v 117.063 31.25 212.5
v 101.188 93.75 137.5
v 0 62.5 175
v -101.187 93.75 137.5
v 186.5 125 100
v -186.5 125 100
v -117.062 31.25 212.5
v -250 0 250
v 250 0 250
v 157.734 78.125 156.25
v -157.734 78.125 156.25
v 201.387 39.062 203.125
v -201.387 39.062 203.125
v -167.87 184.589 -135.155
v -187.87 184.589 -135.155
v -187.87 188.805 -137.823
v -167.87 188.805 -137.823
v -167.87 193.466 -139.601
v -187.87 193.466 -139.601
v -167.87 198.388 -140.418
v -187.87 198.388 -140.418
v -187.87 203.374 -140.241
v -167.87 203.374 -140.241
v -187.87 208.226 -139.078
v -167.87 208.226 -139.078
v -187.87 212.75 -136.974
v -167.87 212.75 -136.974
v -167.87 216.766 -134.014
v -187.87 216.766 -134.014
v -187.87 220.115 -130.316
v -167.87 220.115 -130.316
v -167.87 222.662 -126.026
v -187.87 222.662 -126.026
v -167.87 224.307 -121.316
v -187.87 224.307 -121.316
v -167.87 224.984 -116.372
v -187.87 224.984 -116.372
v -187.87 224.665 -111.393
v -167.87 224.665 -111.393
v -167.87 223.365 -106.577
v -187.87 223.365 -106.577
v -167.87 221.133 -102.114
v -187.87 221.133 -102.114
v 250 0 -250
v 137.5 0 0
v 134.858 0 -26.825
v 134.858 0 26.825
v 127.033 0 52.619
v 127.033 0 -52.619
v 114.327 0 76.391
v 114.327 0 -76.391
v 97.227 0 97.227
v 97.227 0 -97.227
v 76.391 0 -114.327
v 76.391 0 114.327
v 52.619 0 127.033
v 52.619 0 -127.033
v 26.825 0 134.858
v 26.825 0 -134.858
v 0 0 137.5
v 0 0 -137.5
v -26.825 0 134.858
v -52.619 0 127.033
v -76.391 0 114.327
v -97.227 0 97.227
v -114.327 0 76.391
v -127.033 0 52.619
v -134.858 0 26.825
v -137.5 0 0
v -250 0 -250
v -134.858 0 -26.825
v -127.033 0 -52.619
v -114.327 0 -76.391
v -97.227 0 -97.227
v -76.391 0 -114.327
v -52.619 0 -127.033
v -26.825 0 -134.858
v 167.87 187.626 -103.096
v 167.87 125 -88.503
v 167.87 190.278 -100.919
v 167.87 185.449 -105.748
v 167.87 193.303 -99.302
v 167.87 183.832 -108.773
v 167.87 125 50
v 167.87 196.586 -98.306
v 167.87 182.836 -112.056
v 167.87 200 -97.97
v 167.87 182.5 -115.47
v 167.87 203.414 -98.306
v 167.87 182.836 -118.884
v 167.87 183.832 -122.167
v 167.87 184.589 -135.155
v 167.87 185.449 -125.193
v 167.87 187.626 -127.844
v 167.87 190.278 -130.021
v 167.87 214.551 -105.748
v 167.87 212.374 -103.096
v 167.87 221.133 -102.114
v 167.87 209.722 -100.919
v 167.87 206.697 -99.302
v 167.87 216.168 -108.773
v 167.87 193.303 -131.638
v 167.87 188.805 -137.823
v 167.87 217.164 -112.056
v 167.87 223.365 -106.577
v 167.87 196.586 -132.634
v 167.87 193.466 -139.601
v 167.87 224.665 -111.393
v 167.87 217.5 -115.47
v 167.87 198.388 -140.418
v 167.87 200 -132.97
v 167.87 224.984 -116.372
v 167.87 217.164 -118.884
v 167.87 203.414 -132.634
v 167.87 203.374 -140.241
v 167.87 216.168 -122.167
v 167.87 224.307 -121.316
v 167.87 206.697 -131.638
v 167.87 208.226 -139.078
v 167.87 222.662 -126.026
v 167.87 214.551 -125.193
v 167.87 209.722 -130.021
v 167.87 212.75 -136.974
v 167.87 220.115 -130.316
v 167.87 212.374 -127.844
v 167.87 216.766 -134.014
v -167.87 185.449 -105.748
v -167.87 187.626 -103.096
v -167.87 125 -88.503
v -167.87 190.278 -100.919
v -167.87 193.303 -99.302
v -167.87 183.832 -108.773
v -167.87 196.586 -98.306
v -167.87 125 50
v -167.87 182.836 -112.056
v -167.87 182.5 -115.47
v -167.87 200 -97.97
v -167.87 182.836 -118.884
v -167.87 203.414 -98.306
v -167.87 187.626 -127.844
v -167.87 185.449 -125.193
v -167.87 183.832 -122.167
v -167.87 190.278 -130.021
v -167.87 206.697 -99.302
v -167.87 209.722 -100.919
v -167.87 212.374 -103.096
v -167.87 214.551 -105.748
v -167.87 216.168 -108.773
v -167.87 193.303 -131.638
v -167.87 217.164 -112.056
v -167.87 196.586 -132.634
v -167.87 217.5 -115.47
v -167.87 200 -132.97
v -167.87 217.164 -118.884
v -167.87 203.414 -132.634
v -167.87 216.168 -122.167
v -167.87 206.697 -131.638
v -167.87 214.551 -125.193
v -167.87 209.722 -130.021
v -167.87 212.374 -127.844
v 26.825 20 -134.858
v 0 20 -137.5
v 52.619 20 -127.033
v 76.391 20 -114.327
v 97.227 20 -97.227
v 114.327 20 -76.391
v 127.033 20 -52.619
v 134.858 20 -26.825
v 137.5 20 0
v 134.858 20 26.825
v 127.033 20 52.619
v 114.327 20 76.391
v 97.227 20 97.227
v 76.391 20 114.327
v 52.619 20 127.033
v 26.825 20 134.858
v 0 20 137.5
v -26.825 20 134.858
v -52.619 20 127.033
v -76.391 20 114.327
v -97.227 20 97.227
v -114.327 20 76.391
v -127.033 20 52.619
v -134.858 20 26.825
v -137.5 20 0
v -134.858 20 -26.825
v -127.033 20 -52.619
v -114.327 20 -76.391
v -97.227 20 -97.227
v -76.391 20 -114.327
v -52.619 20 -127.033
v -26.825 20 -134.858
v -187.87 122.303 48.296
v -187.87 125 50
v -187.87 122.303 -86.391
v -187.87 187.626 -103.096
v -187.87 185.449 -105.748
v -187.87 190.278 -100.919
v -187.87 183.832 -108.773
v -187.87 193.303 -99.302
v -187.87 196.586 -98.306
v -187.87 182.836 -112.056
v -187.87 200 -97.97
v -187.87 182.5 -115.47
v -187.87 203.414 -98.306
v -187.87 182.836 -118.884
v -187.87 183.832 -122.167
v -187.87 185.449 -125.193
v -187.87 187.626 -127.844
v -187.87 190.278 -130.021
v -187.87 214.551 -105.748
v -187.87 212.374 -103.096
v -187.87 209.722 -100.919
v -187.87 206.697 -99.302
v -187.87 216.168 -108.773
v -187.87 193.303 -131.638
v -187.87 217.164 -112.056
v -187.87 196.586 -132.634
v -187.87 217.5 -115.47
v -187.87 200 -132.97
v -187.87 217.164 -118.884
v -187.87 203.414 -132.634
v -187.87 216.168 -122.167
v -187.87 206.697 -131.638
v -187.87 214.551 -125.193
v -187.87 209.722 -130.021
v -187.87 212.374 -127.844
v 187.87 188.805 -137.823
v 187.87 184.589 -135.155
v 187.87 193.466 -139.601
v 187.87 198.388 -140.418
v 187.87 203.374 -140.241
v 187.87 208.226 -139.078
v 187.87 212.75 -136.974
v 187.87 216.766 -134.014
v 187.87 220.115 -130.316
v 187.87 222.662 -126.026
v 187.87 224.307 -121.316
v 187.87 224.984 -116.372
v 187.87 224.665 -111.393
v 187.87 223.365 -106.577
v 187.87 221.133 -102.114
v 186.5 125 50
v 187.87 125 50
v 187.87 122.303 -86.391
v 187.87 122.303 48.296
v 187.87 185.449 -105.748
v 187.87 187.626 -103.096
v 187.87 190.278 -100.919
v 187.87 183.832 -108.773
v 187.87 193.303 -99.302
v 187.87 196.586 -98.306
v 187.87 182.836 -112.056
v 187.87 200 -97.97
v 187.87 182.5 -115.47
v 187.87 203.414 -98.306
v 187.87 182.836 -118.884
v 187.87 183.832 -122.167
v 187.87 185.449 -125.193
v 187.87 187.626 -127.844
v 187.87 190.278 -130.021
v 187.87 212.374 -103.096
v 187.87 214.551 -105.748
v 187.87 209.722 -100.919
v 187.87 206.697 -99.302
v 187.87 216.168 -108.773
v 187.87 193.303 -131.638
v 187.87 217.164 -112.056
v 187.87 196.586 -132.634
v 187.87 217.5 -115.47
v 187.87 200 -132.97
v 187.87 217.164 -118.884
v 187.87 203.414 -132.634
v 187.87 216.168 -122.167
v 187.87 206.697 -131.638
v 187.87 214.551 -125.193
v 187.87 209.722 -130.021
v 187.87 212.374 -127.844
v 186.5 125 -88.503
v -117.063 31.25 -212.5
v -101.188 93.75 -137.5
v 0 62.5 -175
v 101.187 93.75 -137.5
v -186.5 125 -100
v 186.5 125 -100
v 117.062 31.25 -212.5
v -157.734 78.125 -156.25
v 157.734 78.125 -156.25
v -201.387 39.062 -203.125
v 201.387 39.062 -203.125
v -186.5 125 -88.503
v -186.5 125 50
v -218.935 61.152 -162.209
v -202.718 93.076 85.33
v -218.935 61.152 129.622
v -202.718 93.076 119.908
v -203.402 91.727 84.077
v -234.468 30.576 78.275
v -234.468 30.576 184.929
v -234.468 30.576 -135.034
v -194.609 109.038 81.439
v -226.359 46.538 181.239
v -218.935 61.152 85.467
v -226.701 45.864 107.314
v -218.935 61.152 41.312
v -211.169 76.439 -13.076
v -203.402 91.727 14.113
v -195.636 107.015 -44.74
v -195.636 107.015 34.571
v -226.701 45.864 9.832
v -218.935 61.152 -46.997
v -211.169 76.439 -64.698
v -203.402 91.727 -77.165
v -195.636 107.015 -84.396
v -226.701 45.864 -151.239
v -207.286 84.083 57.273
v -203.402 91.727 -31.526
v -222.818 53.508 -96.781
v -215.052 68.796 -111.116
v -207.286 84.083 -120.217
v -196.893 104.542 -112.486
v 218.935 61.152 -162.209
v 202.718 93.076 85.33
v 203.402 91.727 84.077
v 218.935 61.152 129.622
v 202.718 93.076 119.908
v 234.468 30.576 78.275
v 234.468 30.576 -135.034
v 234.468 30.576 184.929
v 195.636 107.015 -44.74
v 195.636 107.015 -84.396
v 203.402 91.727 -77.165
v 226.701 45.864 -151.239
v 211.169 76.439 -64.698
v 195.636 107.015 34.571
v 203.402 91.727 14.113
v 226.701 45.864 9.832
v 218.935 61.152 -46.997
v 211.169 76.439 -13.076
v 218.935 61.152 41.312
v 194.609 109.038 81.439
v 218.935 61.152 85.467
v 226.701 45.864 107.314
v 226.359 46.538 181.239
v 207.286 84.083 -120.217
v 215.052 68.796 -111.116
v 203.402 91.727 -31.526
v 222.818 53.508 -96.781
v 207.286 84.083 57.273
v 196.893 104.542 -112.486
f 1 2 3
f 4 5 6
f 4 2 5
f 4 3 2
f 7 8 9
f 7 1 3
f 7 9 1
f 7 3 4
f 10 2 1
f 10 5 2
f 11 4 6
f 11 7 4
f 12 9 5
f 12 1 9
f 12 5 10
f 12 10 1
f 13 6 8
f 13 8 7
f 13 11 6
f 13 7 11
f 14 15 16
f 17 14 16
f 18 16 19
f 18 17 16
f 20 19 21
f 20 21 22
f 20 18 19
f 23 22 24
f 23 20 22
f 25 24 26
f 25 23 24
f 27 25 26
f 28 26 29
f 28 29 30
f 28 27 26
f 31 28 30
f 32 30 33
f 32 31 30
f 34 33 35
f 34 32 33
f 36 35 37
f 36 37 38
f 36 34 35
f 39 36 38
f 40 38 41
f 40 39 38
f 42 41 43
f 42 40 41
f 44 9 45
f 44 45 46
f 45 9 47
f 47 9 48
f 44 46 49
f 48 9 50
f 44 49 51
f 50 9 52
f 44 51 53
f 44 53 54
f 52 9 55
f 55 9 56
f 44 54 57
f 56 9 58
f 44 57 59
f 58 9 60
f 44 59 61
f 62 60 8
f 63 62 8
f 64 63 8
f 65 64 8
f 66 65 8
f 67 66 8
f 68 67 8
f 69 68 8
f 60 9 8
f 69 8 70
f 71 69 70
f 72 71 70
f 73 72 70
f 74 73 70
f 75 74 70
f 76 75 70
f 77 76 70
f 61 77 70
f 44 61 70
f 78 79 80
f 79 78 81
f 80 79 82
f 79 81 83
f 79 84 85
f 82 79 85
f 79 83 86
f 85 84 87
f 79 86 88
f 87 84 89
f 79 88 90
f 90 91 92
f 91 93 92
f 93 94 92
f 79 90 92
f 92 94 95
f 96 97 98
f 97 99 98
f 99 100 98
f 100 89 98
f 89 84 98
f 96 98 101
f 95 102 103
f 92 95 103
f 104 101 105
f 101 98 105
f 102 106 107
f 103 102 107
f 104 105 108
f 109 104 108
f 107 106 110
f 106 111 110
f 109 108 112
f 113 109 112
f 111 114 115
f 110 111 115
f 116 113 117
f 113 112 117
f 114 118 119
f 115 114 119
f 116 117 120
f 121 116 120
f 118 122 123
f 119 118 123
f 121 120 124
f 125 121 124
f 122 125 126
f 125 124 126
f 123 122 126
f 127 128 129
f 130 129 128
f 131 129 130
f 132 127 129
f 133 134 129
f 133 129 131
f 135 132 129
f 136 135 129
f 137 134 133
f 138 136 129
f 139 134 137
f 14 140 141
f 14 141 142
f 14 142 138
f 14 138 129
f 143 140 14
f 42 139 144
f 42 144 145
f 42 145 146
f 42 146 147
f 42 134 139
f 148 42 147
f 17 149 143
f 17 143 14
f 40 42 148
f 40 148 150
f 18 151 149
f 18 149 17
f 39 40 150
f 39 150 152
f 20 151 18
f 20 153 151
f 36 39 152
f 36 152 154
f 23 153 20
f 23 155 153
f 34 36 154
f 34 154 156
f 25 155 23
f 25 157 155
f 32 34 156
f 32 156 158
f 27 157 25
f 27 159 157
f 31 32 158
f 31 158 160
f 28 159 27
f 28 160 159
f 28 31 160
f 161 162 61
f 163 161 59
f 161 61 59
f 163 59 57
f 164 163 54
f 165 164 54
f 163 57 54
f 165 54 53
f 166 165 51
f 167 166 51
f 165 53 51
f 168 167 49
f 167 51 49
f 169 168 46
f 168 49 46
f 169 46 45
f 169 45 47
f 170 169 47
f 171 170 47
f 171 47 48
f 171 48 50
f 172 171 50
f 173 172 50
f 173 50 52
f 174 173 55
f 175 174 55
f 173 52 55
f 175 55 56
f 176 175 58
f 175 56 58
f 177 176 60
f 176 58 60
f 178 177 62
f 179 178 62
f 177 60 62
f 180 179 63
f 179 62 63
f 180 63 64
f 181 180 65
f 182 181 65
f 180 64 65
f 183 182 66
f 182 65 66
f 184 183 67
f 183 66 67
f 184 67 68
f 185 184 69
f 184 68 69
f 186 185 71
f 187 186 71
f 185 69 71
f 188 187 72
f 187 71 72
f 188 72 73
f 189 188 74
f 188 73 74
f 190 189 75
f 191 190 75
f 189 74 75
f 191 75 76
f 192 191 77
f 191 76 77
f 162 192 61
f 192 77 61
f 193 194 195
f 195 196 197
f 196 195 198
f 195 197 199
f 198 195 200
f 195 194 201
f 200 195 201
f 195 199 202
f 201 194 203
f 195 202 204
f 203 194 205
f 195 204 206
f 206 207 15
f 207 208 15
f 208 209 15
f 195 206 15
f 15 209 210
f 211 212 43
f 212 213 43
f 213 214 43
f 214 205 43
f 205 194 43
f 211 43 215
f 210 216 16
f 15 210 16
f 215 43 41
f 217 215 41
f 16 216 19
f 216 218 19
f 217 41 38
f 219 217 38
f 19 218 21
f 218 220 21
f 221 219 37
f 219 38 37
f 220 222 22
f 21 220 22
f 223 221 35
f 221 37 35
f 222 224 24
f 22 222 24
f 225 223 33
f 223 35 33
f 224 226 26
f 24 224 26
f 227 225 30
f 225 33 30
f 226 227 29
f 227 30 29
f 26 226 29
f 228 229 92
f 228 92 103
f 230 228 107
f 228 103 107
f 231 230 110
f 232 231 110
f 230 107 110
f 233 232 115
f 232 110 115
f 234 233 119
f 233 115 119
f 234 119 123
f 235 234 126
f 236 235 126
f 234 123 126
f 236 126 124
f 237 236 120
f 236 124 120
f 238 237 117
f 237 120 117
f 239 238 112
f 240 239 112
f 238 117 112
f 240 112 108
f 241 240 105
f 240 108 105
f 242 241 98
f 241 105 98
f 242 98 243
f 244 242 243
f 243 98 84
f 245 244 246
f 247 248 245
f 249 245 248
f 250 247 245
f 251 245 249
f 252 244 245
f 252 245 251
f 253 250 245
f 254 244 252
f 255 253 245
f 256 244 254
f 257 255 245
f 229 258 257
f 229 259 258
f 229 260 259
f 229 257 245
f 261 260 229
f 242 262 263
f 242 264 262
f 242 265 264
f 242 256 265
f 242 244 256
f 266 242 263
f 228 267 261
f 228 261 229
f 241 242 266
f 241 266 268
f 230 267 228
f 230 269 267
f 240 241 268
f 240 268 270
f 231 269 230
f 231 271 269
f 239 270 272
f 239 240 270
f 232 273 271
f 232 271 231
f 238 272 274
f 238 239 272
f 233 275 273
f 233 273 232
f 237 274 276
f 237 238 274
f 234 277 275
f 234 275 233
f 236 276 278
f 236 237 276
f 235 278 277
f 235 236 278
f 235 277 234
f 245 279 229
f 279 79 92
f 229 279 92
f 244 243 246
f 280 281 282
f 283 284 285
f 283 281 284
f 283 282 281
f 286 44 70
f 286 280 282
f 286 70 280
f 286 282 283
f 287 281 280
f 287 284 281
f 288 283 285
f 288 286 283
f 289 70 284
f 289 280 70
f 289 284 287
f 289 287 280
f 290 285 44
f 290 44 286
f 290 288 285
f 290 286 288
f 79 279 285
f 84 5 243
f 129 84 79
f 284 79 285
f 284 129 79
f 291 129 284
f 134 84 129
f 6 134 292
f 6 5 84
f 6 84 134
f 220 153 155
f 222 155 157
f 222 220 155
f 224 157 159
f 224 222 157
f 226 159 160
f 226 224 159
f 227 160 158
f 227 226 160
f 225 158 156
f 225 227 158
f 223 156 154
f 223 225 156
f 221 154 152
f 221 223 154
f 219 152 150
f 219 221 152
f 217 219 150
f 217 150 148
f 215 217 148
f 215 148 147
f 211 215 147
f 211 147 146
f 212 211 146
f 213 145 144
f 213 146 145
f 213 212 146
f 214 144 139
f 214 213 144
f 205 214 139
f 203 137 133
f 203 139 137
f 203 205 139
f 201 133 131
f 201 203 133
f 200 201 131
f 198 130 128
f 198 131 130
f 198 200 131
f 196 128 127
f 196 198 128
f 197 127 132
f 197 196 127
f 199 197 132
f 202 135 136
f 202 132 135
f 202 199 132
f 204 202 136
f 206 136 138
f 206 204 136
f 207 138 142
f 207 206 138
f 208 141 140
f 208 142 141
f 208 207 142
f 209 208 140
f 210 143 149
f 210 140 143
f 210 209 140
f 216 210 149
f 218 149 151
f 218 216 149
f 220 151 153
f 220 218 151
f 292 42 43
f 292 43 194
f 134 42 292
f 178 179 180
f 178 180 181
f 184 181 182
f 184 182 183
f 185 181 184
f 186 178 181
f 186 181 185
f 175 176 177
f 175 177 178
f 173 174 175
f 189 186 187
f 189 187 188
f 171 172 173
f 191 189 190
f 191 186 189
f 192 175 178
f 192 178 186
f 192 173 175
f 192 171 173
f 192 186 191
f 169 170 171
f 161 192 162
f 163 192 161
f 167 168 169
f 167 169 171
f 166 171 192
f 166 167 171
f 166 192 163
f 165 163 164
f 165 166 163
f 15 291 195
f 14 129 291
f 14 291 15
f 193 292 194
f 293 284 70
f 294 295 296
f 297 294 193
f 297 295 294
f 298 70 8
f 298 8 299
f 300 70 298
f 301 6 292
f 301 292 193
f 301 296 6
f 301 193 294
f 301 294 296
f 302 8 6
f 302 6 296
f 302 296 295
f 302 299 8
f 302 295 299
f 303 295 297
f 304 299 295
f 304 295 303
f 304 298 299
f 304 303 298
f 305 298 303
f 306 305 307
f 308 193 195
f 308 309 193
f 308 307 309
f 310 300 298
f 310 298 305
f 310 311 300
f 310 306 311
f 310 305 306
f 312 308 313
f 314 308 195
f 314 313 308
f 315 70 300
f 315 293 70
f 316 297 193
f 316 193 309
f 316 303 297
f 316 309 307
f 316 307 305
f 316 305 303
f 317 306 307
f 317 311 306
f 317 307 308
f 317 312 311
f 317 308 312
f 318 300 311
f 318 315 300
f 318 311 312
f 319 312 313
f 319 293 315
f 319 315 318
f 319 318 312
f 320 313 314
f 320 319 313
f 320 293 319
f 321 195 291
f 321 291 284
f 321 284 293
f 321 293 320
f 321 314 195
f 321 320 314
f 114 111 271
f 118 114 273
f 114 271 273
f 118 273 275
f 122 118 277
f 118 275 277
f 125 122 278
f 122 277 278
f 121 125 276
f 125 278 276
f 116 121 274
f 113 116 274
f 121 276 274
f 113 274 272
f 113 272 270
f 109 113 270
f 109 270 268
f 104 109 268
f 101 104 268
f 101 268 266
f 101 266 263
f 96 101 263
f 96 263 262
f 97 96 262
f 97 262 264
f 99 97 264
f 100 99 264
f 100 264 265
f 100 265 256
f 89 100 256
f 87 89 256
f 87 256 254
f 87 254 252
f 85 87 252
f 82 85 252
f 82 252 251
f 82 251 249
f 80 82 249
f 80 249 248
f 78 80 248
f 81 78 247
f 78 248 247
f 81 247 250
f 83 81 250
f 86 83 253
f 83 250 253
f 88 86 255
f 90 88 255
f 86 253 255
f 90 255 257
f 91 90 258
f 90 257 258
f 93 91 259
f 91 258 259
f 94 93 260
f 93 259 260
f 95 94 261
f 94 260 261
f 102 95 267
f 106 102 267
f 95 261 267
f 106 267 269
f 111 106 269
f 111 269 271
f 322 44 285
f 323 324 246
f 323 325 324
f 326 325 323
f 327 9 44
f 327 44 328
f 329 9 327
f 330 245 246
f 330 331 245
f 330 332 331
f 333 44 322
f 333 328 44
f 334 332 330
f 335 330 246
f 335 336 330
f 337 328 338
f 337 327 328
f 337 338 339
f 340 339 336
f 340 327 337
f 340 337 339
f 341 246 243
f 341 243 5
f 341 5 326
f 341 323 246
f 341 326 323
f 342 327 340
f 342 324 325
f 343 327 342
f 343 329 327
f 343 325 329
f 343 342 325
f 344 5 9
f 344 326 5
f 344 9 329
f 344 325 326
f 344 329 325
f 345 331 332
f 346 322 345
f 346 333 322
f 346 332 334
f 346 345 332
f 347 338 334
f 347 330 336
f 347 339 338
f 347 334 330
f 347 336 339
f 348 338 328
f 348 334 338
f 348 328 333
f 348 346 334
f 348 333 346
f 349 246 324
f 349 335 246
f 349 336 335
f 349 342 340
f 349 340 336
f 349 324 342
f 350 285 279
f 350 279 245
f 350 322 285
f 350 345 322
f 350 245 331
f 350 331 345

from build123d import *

# Parameters (mm, degrees)
SKETCH4_R           = 137.5
CUT_EXTRUDE1_DEPTH  = 20
BOSS_EXTRUDE1_START = 167.87
BOSS_EXTRUDE1_DEPTH = 20
SKETCH6_R           = 17.5
CUT_EXTRUDE2_DEPTH  = 553.13688256


with BuildPart() as part:
    # Sketch3 → Loft1 section 0
    with BuildSketch(Plane(origin=(0, 125, 0), x_dir=(1, 0, 0), z_dir=(0, 1, 0))):
        with BuildLine():
            Line((186.5, -100), (-186.5, -100))
            Line((-186.5, -100), (-186.5, 100))
            Line((-186.5, 100), (186.5, 100))
            Line((186.5, 100), (186.5, -100))
        make_face()
    # Sketch2 → Loft1 section 1
    with BuildSketch(Plane(origin=(0, 0, 0), x_dir=(1, 0, 0), z_dir=(0, 1, 0))):
        with BuildLine():
            Line((250, -250), (-250, -250))
            Line((-250, -250), (-250, 250))
            Line((-250, 250), (250, 250))
            Line((250, 250), (250, -250))
        make_face()
    loft()

    # Sketch4 → Cut-Extrude1 (cut)
    with BuildSketch(Plane.XZ):
        with Locations(Location((0, 0, 0), (0, 0, 270))):
            Circle(SKETCH4_R)
    extrude(amount=-CUT_EXTRUDE1_DEPTH, mode=Mode.SUBTRACT)

    # Sketch5 → Boss-Extrude1 (add)
    with BuildSketch(Plane(origin=(0, 54.782797639, 0), x_dir=(0, 0, -1), z_dir=(1, 0, 0)).offset(BOSS_EXTRUDE1_START)):
        with BuildLine():
            Line((102.114142863, 166.350579801), (-50, 70.217202361))
            Line((-50, 70.217202361), (11.864642245, -27.672701013))
            Line((11.864642245, -27.672701013), (135.154881767, 129.805922421))
            ThreePointArc((135.154881767, 129.805922421), (134.01437354, 161.983484202), (102.114142863, 166.350579801))
        make_face()
    boss_extrude1 = extrude(amount=BOSS_EXTRUDE1_DEPTH)

    # Sketch6 → Cut-Extrude2 (cut, through all)
    with BuildSketch(Plane(origin=(187.87, 0, 0), x_dir=(0, 0, -1), z_dir=(1, 0, 0))):
        with Locations((115.470053838, 200)):
            Circle(SKETCH6_R)
    cut_extrude2 = extrude(amount=-CUT_EXTRUDE2_DEPTH, mode=Mode.SUBTRACT)

    # Mirror1: Boss-Extrude1, Cut-Extrude2 across plane
    add(boss_extrude1.mirror(Plane(origin=(0, 0, 0), x_dir=(0, 0, 1), z_dir=(1, 0, 0))))
    add(cut_extrude2.mirror(Plane(origin=(0, 0, 0), x_dir=(0, 0, 1), z_dir=(1, 0, 0))), mode=Mode.SUBTRACT)


solid = part.part
